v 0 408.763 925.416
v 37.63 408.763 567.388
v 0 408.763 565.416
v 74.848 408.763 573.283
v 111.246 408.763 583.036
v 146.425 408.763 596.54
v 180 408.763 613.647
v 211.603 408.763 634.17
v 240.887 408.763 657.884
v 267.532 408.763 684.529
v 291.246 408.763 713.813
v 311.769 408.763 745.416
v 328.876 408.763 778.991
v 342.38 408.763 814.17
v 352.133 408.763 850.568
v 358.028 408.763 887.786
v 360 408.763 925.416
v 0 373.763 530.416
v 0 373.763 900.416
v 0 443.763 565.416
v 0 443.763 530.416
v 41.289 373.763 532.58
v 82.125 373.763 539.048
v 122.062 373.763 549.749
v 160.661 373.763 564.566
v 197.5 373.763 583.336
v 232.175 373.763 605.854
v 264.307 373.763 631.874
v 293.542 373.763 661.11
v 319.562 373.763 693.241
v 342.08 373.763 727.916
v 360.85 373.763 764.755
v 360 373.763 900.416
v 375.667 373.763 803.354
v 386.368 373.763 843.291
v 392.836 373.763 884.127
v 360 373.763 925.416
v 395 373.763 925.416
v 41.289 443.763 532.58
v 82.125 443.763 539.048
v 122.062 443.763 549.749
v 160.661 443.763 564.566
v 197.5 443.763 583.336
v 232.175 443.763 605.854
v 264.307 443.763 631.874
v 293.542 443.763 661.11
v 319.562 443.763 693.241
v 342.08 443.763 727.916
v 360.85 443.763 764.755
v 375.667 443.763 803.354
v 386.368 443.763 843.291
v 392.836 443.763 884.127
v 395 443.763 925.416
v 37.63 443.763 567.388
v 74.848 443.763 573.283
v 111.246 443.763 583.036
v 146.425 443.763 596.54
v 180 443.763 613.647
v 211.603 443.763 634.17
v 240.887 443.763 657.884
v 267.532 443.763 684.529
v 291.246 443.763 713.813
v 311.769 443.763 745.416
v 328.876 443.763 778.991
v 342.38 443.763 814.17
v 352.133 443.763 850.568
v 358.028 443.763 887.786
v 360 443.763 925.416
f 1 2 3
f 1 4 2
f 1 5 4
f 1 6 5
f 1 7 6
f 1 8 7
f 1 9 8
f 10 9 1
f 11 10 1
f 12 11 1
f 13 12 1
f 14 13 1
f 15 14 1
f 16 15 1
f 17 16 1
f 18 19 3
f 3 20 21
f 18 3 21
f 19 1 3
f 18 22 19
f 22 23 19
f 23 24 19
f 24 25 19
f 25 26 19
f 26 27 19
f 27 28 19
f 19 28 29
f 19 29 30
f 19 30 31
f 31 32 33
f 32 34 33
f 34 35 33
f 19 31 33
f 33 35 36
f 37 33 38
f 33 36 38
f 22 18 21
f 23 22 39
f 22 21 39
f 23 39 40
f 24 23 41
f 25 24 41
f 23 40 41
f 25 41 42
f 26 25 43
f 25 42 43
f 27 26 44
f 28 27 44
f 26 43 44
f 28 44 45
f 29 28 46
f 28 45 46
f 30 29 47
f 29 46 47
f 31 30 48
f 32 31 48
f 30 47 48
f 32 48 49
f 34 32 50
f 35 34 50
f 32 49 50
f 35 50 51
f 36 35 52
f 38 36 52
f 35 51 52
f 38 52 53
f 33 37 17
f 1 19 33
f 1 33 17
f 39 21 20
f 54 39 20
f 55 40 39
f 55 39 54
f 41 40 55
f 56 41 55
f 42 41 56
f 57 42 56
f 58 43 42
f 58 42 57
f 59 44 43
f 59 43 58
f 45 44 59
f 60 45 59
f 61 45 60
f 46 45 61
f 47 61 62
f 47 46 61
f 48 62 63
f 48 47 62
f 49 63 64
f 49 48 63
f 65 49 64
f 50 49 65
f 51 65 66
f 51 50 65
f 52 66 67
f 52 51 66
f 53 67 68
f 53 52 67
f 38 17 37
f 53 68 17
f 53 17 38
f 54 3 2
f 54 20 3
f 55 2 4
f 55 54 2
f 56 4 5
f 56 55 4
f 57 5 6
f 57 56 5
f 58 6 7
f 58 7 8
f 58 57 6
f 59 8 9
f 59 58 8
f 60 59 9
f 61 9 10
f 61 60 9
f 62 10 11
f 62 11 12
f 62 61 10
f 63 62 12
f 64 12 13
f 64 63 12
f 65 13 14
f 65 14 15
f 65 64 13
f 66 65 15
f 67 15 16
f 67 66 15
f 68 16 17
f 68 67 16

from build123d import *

# Parameters (mm, degrees)
CROQUIS3_W            = 395
CROQUIS3_H            = 35
REVOLUCI_N1_ANGLE     = 90
CROQUIS5_W            = 35
CROQUIS5_H            = 35
REVOLUCI_N3_ANGLE     = 90
CORTAR_EXTRUIR5_DEPTH = 360


with BuildPart() as part:
    # Croquis3 → Revolución1 (revolve)
    with BuildSketch(Plane(origin=(0, 0, 0), x_dir=(0, 0, -1), z_dir=(1, 0, 0))):
        with Locations((-727.916095406, 391.262754858)):
            Rectangle(CROQUIS3_W, CROQUIS3_H)
    revolve(axis=Axis((0, 408.762754858, 925.416095406), (0, -1, 0)), revolution_arc=REVOLUCI_N1_ANGLE)

    # Croquis5 → Revolución3 (revolve)
    with BuildSketch(Plane(origin=(0, 0, 0), x_dir=(0, 0, -1), z_dir=(1, 0, 0))):
        with Locations((-547.916095406, 426.262754858)):
            Rectangle(CROQUIS5_W, CROQUIS5_H)
    revolve(axis=Axis((0, 408.762754858, 925.416095406), (0, -1, 0)), revolution_arc=REVOLUCI_N3_ANGLE)

    # Croquis17 → Cortar-Extruir5 (cut)
    with BuildSketch(Plane.ZY):
        Polygon((925.416095406, 373.762754858), (900.416095406, 373.762754858), (925.416095406, 408.762754858), align=None)
    extrude(amount=-CORTAR_EXTRUIR5_DEPTH, mode=Mode.SUBTRACT)


solid = part.part
